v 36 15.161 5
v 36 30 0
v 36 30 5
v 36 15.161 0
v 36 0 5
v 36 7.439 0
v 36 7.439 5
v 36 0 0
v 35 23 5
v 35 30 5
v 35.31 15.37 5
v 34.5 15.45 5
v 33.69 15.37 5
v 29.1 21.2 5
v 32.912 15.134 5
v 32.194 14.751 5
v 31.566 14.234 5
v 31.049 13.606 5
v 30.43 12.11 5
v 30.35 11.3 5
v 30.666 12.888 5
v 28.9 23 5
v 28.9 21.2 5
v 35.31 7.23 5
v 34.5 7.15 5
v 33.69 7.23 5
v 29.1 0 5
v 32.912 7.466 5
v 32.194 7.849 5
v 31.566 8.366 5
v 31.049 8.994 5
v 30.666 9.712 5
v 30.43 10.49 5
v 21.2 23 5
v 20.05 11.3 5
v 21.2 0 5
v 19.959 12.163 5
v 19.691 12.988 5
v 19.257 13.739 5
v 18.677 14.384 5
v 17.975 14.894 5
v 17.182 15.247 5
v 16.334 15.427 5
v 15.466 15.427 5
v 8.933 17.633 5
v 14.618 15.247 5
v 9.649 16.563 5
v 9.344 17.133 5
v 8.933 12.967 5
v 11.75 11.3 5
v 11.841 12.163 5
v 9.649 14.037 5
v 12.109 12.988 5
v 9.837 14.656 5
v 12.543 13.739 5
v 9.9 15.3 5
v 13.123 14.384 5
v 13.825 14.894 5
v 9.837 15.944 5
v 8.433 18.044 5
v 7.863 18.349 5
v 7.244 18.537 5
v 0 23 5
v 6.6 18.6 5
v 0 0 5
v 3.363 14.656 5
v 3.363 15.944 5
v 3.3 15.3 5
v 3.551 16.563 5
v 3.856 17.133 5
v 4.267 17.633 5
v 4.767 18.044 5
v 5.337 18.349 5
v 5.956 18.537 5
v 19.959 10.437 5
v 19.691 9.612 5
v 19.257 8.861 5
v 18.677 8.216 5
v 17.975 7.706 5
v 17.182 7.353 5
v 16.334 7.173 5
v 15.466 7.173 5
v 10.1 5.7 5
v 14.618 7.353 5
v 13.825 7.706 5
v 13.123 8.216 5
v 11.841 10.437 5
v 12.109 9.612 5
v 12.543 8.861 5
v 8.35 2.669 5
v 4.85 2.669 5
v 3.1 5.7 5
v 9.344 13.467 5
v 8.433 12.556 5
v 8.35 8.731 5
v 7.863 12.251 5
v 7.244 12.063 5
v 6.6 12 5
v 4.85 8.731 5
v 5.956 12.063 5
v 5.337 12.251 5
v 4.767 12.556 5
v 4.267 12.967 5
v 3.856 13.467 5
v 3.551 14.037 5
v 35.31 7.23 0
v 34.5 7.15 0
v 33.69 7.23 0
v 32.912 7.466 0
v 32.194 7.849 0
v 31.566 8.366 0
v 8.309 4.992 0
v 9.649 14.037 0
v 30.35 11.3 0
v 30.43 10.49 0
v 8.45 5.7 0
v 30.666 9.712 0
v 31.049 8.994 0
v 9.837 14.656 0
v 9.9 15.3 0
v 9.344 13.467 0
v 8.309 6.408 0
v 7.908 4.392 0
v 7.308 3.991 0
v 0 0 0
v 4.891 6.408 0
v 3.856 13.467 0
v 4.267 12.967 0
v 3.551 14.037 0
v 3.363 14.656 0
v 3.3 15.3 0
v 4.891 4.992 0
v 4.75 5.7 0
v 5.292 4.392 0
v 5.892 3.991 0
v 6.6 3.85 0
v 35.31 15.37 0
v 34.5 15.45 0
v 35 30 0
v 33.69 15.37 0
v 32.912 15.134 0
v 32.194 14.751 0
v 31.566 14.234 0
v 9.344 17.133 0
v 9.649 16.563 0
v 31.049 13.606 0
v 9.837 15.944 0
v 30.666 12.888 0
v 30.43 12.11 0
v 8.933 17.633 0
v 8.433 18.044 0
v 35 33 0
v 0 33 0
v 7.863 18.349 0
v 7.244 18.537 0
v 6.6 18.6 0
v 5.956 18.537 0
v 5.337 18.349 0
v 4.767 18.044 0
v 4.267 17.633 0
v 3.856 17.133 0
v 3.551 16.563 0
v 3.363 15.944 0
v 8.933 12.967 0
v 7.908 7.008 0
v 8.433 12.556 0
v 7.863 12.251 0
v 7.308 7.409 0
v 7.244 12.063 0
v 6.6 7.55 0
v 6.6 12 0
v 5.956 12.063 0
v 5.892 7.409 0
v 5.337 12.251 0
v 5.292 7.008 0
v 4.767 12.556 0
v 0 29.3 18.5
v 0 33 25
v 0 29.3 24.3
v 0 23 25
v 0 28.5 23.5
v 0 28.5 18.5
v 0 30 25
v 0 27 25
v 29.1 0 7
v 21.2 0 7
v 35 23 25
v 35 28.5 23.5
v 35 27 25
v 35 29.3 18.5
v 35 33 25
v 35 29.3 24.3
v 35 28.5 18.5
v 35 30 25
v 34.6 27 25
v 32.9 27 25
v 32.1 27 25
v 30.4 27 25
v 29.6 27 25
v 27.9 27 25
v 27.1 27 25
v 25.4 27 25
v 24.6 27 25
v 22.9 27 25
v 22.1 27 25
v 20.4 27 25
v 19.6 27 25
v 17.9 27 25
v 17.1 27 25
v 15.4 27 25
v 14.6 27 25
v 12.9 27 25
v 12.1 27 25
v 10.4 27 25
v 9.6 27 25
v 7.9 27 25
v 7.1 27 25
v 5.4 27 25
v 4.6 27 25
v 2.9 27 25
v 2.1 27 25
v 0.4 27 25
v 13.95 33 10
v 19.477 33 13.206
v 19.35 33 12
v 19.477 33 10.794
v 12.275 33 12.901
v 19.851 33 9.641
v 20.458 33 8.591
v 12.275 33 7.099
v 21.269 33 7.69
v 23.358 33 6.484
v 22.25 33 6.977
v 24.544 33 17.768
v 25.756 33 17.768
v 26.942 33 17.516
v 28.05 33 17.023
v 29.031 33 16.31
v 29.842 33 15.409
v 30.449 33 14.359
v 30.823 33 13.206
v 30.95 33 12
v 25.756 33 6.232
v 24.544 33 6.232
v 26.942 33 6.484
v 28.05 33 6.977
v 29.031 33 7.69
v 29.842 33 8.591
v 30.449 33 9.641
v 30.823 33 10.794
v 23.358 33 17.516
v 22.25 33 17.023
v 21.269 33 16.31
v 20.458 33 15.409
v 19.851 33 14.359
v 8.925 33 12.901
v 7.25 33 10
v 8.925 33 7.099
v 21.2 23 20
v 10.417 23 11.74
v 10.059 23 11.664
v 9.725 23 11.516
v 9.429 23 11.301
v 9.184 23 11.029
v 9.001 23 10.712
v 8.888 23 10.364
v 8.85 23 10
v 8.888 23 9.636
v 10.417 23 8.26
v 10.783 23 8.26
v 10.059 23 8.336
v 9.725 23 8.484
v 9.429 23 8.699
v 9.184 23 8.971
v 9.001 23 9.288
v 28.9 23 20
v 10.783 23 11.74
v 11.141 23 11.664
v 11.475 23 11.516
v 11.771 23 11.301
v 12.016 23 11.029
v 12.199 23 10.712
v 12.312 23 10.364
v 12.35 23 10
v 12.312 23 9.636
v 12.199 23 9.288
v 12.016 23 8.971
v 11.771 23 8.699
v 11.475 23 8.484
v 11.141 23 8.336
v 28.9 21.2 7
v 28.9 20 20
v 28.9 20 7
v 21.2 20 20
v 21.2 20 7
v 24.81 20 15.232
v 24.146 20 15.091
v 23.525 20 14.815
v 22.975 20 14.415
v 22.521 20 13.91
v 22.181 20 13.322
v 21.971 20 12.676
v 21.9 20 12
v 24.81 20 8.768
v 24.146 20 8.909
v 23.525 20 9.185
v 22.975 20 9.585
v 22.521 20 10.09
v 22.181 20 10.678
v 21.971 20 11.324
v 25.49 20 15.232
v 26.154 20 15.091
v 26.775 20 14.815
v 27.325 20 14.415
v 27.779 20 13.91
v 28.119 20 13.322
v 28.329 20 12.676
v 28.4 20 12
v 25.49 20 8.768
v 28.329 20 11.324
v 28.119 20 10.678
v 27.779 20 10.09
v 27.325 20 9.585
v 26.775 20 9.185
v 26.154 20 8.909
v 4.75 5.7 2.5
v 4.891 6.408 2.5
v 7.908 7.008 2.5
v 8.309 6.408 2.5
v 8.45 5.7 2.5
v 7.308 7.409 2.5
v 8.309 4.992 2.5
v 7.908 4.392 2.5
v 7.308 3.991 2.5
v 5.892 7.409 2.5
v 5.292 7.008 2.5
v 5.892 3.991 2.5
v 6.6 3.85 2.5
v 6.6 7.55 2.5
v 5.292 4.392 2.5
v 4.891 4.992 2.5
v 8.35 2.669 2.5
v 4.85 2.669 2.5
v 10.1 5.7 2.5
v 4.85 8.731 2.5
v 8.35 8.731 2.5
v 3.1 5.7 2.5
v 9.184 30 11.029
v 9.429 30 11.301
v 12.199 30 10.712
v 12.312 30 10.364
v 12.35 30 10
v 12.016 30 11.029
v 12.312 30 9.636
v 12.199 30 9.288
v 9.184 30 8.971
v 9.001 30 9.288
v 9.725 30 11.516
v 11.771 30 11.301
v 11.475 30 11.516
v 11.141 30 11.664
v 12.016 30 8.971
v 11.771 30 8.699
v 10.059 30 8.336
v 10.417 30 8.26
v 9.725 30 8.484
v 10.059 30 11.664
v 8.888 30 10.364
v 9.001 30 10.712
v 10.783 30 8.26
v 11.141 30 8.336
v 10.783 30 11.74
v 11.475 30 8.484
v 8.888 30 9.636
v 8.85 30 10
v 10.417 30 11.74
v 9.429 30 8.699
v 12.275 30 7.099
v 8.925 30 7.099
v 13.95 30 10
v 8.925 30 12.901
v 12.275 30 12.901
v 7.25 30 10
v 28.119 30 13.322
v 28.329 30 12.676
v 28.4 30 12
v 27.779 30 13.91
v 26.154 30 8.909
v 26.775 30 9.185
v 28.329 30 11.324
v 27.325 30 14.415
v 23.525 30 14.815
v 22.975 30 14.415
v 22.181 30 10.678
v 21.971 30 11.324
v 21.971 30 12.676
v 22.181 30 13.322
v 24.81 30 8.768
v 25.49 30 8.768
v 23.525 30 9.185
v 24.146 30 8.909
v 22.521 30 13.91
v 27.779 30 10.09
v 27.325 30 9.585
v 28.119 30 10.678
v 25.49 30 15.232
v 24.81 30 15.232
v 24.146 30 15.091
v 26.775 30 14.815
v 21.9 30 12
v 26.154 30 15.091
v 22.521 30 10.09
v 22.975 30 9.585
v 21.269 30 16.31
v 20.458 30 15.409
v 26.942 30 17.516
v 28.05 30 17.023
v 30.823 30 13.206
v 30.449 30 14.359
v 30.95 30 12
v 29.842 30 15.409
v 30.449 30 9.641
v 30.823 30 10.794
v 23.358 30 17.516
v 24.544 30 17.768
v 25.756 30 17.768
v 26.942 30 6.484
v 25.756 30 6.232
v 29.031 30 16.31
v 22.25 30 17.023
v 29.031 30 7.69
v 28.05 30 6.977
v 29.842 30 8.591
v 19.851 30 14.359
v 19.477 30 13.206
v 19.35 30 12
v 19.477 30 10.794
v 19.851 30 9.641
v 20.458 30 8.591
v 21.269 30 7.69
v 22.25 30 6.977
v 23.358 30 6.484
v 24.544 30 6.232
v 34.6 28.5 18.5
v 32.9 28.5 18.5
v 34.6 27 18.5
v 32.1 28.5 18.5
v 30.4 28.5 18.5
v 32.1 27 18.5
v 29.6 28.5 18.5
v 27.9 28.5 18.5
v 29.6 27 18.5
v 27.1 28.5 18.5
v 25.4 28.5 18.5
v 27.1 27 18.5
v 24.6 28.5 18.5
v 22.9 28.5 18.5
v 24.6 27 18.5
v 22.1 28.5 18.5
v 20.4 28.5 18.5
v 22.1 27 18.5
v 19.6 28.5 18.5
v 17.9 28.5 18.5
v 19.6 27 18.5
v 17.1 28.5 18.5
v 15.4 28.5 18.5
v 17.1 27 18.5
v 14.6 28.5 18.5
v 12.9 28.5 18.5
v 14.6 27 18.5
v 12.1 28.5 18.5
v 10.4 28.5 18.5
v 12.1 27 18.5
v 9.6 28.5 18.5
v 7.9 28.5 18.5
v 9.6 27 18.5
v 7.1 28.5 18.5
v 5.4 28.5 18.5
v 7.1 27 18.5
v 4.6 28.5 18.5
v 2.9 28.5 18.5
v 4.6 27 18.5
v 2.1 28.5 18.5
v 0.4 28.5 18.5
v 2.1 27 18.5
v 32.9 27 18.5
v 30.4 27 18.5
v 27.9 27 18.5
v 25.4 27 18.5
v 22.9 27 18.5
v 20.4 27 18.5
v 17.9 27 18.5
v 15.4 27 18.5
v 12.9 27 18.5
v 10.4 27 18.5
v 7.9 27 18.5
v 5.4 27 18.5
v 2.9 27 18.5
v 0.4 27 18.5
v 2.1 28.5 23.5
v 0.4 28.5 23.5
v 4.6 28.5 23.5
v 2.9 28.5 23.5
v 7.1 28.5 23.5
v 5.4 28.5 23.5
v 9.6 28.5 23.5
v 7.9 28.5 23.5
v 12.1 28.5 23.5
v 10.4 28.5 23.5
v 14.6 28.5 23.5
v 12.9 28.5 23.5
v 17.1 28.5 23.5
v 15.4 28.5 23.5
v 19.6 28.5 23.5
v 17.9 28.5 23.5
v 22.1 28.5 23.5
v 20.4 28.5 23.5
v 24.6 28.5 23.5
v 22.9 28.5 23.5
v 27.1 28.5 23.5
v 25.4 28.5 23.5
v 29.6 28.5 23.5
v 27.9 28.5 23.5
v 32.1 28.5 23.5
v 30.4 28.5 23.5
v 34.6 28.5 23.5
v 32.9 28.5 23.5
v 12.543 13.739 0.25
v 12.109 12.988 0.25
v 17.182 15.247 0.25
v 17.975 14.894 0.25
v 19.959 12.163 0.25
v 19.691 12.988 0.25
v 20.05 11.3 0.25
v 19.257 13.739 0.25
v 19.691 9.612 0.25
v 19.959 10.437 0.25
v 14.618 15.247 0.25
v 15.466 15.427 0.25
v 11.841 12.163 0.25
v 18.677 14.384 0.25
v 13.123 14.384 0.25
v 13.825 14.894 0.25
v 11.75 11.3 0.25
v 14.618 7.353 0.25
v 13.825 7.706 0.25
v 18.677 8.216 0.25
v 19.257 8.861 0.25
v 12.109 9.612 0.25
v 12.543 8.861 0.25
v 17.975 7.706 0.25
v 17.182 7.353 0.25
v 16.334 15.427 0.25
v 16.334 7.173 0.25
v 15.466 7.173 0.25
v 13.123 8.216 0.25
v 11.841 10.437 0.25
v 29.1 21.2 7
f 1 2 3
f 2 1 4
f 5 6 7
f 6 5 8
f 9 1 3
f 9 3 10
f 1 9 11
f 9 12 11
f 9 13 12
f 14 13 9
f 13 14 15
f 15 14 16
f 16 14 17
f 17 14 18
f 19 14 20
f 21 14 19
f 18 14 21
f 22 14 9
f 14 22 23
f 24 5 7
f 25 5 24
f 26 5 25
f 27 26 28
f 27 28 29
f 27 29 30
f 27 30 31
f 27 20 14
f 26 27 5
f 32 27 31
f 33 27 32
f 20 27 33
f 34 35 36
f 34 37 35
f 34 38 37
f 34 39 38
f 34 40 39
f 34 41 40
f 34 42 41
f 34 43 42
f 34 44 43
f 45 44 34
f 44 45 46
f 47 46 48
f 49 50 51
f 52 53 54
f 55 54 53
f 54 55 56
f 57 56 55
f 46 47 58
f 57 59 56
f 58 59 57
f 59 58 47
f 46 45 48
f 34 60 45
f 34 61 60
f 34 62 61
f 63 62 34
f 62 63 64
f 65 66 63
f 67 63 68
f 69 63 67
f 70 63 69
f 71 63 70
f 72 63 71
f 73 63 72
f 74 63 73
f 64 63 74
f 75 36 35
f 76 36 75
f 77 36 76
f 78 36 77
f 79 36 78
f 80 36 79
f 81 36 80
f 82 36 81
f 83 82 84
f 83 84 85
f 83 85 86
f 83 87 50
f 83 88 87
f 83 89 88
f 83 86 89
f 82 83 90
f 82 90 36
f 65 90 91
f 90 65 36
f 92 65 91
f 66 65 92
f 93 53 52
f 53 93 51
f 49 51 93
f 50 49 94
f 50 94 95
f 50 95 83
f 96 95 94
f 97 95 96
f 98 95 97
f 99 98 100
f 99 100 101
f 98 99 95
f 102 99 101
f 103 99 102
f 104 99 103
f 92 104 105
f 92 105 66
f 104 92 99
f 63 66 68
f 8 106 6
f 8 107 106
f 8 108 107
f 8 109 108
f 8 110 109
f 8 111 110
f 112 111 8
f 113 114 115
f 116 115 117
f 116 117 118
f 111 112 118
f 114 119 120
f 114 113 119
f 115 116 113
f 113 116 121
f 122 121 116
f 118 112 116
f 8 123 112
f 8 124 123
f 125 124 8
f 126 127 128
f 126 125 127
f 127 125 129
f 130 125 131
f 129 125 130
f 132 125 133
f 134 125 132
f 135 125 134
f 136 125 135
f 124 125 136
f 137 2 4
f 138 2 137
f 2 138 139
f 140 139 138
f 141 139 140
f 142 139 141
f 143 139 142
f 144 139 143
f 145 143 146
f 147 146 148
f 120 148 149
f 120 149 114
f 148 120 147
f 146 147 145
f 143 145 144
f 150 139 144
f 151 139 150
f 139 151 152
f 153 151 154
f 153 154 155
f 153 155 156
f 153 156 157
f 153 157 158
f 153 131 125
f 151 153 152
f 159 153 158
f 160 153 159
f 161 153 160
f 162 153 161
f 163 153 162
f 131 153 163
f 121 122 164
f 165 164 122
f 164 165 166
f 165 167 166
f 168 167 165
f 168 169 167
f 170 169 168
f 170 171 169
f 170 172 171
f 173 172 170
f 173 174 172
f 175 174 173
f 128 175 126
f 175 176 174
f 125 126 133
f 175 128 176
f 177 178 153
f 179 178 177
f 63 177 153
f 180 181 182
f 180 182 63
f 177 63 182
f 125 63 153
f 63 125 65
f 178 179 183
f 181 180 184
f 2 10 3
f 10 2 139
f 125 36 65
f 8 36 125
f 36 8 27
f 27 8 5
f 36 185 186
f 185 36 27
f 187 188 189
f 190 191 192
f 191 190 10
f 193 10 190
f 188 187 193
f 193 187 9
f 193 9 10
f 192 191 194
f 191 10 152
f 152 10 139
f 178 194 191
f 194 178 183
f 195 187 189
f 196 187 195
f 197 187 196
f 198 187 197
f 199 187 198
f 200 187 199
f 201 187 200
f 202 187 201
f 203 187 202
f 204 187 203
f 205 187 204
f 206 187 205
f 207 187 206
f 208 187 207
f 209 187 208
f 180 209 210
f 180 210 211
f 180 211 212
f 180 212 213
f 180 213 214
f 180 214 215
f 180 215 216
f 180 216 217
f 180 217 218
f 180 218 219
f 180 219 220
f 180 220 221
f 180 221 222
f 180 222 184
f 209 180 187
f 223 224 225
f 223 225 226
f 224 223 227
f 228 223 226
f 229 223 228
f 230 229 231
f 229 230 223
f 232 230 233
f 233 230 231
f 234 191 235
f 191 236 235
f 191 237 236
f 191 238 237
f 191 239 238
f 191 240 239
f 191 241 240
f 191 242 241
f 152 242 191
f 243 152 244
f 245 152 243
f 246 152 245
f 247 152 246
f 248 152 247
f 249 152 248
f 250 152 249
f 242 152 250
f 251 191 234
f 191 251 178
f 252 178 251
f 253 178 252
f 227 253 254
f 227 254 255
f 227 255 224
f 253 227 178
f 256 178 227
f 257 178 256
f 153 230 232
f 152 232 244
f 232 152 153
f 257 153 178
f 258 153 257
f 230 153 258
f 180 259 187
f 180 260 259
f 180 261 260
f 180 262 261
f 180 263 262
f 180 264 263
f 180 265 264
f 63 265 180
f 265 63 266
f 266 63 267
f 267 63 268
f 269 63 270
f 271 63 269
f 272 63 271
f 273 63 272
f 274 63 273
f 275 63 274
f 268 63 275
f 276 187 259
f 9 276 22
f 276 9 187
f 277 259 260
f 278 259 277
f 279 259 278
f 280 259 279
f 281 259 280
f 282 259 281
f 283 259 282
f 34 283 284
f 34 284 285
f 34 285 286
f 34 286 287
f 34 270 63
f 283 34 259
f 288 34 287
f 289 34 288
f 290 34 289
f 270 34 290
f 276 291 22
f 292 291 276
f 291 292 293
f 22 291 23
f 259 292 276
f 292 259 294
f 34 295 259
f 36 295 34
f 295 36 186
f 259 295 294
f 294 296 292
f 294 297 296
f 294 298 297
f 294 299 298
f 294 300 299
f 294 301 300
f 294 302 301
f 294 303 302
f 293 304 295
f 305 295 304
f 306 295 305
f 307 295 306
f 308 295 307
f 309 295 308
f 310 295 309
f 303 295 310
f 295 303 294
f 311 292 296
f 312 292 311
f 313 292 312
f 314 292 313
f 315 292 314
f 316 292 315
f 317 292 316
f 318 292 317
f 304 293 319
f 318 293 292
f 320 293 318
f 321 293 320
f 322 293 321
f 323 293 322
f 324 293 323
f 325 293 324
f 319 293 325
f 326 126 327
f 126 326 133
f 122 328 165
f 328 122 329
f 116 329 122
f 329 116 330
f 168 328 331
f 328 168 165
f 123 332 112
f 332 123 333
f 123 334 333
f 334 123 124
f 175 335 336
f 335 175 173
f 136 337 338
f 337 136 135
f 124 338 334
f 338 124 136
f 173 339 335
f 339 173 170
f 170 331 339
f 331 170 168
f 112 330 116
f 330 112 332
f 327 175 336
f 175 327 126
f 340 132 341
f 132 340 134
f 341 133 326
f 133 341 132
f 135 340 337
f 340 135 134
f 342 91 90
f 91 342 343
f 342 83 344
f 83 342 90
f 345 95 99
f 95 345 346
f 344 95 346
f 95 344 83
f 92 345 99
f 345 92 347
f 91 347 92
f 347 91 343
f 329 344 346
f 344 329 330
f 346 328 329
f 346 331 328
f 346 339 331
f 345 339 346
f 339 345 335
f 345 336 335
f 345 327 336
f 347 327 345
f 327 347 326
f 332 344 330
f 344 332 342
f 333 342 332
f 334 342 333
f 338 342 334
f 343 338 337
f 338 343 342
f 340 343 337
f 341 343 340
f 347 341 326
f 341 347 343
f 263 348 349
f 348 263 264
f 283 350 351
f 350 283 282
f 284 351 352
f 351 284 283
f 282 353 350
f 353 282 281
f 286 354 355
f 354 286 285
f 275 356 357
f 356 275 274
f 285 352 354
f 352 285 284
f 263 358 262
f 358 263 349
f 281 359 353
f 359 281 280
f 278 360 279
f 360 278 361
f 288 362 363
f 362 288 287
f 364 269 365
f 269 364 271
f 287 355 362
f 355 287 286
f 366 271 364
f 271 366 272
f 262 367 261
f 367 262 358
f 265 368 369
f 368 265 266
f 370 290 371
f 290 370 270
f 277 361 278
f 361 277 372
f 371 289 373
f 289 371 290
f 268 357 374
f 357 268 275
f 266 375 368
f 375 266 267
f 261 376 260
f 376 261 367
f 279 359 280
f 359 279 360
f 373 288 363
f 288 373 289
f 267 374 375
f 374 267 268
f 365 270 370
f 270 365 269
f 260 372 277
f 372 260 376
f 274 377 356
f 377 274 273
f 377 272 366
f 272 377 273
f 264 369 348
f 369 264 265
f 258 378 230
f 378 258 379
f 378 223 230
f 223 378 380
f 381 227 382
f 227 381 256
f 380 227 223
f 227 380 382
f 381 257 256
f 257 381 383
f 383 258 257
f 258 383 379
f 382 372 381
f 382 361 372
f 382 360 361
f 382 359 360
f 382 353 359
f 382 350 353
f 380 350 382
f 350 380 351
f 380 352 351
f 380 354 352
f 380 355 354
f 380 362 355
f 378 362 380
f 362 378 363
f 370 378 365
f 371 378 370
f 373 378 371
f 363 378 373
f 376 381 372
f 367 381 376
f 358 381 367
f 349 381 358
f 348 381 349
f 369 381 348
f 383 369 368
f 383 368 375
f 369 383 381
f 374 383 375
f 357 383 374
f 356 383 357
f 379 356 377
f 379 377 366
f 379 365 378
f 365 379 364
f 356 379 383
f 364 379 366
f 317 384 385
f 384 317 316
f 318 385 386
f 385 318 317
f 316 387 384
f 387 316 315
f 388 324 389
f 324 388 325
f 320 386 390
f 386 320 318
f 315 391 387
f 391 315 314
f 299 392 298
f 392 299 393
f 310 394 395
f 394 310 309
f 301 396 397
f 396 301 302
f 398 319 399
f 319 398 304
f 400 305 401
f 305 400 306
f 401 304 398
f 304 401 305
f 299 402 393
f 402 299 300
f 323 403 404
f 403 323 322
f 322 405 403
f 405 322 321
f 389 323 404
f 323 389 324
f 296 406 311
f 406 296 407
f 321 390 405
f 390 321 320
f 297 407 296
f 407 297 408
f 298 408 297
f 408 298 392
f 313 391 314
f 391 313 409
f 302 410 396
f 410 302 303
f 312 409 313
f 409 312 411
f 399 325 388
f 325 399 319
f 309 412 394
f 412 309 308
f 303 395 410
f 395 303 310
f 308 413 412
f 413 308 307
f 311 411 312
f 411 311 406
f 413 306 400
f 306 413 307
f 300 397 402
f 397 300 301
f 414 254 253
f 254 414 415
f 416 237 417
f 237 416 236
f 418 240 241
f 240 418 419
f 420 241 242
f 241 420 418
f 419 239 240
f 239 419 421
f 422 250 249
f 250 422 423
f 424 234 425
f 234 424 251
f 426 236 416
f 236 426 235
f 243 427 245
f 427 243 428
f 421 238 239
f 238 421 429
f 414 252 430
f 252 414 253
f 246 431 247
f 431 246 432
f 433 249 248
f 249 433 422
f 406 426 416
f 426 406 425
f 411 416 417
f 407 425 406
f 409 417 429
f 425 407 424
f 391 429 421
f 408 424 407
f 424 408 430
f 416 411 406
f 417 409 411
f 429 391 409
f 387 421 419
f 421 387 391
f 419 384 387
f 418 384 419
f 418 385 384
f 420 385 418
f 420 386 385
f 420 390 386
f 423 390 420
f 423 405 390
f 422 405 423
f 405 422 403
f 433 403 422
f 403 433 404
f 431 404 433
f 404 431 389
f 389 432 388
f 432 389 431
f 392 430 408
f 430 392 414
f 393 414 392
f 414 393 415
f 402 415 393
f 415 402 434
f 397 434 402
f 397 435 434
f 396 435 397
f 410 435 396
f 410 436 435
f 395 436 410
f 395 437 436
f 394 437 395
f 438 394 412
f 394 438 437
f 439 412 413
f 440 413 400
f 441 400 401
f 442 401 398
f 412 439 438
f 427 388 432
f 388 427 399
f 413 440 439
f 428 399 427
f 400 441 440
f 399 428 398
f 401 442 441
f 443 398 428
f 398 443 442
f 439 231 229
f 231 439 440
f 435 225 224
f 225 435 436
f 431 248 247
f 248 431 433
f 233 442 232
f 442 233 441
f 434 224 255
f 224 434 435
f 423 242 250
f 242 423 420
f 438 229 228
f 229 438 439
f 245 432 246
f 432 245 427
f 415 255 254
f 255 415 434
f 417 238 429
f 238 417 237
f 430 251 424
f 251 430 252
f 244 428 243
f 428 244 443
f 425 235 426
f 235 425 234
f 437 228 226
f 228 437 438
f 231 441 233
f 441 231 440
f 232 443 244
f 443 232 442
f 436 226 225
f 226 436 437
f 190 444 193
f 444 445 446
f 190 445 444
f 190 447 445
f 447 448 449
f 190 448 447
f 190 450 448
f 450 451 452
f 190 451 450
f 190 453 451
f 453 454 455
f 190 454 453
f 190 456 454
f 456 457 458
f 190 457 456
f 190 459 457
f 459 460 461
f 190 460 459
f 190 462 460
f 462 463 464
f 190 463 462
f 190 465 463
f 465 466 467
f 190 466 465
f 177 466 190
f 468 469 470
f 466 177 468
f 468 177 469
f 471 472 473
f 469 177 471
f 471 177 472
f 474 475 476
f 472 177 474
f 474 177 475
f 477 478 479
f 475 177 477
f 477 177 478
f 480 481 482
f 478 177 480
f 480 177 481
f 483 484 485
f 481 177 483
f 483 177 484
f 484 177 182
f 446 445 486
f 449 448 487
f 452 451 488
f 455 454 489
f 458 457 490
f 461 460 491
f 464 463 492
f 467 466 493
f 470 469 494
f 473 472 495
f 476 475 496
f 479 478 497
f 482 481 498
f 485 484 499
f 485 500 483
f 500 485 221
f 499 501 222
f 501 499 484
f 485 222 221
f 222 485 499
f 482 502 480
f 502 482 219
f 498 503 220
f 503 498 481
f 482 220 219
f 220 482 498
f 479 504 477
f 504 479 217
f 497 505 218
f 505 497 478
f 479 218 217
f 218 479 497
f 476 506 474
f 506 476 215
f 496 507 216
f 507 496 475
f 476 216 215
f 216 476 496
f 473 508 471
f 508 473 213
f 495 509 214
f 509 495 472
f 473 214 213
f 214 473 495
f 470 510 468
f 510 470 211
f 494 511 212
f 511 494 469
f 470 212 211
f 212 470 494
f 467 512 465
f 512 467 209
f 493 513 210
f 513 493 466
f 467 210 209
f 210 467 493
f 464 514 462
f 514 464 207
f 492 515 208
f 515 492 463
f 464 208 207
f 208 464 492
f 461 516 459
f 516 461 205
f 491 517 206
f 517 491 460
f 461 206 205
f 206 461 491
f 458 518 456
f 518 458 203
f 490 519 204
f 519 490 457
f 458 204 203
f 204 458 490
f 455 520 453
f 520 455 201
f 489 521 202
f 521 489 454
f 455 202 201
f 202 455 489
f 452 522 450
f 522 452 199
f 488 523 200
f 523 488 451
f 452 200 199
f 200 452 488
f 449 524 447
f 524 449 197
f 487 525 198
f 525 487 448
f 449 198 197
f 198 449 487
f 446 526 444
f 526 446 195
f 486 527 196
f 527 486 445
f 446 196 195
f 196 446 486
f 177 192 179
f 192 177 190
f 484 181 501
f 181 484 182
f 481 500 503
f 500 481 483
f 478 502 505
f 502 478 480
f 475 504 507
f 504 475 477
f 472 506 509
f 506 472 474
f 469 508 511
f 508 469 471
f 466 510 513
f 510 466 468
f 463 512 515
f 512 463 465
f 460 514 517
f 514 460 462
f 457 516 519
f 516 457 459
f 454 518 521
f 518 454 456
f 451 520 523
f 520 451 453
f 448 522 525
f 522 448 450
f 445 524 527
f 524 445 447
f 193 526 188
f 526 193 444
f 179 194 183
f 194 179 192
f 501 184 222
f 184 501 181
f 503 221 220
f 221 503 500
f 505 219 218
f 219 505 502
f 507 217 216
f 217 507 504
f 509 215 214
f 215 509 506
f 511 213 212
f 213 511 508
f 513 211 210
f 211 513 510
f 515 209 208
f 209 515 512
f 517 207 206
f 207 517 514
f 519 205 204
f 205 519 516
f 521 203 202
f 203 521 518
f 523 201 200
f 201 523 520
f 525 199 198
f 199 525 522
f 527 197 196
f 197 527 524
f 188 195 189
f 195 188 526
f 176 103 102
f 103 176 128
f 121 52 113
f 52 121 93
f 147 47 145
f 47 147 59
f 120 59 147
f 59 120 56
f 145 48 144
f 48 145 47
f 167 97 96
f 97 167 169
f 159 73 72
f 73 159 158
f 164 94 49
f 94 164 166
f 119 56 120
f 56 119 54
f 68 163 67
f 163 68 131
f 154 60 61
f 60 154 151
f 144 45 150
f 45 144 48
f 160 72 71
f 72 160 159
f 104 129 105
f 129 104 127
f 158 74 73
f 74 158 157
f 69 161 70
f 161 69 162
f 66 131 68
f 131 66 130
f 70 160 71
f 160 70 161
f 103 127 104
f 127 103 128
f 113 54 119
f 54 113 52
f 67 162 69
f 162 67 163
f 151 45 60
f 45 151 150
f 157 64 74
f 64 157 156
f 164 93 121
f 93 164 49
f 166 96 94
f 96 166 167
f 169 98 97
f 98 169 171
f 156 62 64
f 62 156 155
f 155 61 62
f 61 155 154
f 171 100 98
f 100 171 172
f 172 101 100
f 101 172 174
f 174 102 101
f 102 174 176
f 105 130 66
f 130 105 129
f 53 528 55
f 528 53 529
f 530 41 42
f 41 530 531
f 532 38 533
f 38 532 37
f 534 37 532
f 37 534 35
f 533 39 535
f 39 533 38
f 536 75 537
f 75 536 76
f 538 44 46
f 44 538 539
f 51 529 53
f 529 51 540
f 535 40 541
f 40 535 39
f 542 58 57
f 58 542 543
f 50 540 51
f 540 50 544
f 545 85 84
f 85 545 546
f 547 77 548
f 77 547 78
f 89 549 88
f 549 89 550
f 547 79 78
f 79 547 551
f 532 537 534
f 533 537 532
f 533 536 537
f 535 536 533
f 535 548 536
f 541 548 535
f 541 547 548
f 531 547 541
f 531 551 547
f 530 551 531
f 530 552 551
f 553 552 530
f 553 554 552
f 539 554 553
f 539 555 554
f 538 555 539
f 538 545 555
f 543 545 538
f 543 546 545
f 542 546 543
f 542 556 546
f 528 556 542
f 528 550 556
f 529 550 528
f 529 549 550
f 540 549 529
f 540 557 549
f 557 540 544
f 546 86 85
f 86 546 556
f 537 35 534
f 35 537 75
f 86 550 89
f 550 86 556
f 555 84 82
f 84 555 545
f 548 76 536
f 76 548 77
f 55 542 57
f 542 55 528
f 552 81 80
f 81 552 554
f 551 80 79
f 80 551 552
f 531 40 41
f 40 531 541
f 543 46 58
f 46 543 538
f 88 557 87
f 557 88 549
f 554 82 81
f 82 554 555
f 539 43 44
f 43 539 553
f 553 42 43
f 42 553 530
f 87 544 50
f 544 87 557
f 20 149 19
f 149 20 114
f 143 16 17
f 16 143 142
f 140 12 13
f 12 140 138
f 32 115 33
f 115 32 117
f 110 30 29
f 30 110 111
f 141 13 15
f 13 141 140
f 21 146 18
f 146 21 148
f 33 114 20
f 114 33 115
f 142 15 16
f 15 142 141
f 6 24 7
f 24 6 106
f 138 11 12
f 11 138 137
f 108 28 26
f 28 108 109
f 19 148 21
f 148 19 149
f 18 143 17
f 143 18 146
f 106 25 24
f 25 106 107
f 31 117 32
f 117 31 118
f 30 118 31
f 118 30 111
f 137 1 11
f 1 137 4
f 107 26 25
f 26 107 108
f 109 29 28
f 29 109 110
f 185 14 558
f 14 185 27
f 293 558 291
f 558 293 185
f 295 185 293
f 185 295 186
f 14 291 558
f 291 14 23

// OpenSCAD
// file: configuration.scad
// Layer high for the printing [mm]
layer_height = 0.25; //Slic3r->Print Settings->Layers and perimeters->Layer height

// Spare for the screws heads [mm]
spare = 1;
// M6 screw diameter [mm]
M6_head_diameter = 10.6+spare;
//M6_head_diameter = 12+spare;

// M6 head high (for hiding it) [mm]
M6_head_height = 3.6;
//M6_head_height = 4.5;

// Screws and rods diameters
M8_smooth_rod_diameter = 8.3;
M8_smooth_rod_diameter_catch = 8.8;
M6_diameter = 6.6;
M6_diamater_horizontal = 6.5;
M3_diameter = 3.7;
M3_diameter_horizontal = 3.5;

// Nuts diameters
M3_nut_diameter = 7.0;
M3_nut_diameter_horizontal = 6.7;

// ALU profile parameters
ALU_cut_width = 7.9;
ALU_cut_width_horizontal = 7.7;

// Motors length/depth (for axes Z and Y)
//SX17-1003LQFE (recommended for the Z axis)
//motor_length = 29.5;
//SX17-1003 (recommended for the Z axis)
motor_length = 34;
//SX17-1005
//motor_length = 40;
//SX17-0905 - this motor is too high - the Z end stop holder has to be adjusted
//motor_length = 48;

// Extrusion width [mm]
extrusion_width = 0.66; //Slic3r->Print Settings->Advanced->Default extrusion width

/// Belt type ******************************************************

// GT2 
//belt_tooth_distance = 2;
//belt_tooth_ratio = 0.5;

// T2.5
belt_tooth_distance = 2.5;
belt_tooth_ratio = 0.68;
// main file
include <./configuration.scad>

difference(){
	union(){
		cube([36,30,5]);
		translate([0,23,0])cube([35,10,25]);
		translate([M6_diameter*2+8,20,0])cube([ALU_cut_width_horizontal,11,20]);
	}
	translate([M6_diameter,M6_diameter+M3_diameter+5,-1])cylinder(r=M6_diameter/2,h=7,$fn=32);
	translate([M6_diameter,M3_diameter+2,-1]){
		cylinder(r=M3_diameter/2,h=7,$fn=16);	
		translate([0,0,3.5])cylinder(r=M3_nut_diameter/2,h=2.6,$fn=6);
	}
	translate([M6_diameter+M8_smooth_rod_diameter_catch+0.5,M8_smooth_rod_diameter+3,layer_height])cylinder(h=7,r=M8_smooth_rod_diameter/2,$fn = 30);
	translate([34.5,M8_smooth_rod_diameter+3,-1])cylinder(h=7,r=M8_smooth_rod_diameter/2,$fn = 32);
	
	translate([M6_diameter+4,34,10]) 
	rotate([90,0,0]){
		cylinder(h = 15, r=M3_diameter_horizontal/2, $fn=30);
		cylinder(h = 4, r=M3_nut_diameter_horizontal/2, $fn=6);
	}

	translate([M6_diameter*2+8+ALU_cut_width/2,34,12]) 
	rotate([90,0,0]){
		cylinder(r = M6_diamater_horizontal/2, h = 15, $fn = 30);
		cylinder(r = M6_head_diameter/2, h = 4, $fn = 30);
	}
	
	translate([-1,27,18.5])belt_holder_beltcut();
}

translate([M6_diameter*2+8,0,0])cube([ALU_cut_width,M6_diameter*2+8,7]);

module belt_holder_beltcut(){
 echo(belt_tooth_ratio*belt_tooth_distance);
 position_tweak=-1.1;
 // Belt slit
 //translate([-66,-0.5+10,3]) 
 translate([0,1.5,0])
 cube([67,0.8,15]);
 // Smooth insert cutout
 //translate([-66,-0.5+10,12]) 
 translate([0,1.5,5])
 rotate([45,0,0]) cube([67,15,15]);
 // Individual teeth
 for ( i = [0 : 23] ){
 	translate([0+i*belt_tooth_distance+position_tweak,0,0]) cube([belt_tooth_ratio*belt_tooth_distance,1.7,15]);
 }
}
